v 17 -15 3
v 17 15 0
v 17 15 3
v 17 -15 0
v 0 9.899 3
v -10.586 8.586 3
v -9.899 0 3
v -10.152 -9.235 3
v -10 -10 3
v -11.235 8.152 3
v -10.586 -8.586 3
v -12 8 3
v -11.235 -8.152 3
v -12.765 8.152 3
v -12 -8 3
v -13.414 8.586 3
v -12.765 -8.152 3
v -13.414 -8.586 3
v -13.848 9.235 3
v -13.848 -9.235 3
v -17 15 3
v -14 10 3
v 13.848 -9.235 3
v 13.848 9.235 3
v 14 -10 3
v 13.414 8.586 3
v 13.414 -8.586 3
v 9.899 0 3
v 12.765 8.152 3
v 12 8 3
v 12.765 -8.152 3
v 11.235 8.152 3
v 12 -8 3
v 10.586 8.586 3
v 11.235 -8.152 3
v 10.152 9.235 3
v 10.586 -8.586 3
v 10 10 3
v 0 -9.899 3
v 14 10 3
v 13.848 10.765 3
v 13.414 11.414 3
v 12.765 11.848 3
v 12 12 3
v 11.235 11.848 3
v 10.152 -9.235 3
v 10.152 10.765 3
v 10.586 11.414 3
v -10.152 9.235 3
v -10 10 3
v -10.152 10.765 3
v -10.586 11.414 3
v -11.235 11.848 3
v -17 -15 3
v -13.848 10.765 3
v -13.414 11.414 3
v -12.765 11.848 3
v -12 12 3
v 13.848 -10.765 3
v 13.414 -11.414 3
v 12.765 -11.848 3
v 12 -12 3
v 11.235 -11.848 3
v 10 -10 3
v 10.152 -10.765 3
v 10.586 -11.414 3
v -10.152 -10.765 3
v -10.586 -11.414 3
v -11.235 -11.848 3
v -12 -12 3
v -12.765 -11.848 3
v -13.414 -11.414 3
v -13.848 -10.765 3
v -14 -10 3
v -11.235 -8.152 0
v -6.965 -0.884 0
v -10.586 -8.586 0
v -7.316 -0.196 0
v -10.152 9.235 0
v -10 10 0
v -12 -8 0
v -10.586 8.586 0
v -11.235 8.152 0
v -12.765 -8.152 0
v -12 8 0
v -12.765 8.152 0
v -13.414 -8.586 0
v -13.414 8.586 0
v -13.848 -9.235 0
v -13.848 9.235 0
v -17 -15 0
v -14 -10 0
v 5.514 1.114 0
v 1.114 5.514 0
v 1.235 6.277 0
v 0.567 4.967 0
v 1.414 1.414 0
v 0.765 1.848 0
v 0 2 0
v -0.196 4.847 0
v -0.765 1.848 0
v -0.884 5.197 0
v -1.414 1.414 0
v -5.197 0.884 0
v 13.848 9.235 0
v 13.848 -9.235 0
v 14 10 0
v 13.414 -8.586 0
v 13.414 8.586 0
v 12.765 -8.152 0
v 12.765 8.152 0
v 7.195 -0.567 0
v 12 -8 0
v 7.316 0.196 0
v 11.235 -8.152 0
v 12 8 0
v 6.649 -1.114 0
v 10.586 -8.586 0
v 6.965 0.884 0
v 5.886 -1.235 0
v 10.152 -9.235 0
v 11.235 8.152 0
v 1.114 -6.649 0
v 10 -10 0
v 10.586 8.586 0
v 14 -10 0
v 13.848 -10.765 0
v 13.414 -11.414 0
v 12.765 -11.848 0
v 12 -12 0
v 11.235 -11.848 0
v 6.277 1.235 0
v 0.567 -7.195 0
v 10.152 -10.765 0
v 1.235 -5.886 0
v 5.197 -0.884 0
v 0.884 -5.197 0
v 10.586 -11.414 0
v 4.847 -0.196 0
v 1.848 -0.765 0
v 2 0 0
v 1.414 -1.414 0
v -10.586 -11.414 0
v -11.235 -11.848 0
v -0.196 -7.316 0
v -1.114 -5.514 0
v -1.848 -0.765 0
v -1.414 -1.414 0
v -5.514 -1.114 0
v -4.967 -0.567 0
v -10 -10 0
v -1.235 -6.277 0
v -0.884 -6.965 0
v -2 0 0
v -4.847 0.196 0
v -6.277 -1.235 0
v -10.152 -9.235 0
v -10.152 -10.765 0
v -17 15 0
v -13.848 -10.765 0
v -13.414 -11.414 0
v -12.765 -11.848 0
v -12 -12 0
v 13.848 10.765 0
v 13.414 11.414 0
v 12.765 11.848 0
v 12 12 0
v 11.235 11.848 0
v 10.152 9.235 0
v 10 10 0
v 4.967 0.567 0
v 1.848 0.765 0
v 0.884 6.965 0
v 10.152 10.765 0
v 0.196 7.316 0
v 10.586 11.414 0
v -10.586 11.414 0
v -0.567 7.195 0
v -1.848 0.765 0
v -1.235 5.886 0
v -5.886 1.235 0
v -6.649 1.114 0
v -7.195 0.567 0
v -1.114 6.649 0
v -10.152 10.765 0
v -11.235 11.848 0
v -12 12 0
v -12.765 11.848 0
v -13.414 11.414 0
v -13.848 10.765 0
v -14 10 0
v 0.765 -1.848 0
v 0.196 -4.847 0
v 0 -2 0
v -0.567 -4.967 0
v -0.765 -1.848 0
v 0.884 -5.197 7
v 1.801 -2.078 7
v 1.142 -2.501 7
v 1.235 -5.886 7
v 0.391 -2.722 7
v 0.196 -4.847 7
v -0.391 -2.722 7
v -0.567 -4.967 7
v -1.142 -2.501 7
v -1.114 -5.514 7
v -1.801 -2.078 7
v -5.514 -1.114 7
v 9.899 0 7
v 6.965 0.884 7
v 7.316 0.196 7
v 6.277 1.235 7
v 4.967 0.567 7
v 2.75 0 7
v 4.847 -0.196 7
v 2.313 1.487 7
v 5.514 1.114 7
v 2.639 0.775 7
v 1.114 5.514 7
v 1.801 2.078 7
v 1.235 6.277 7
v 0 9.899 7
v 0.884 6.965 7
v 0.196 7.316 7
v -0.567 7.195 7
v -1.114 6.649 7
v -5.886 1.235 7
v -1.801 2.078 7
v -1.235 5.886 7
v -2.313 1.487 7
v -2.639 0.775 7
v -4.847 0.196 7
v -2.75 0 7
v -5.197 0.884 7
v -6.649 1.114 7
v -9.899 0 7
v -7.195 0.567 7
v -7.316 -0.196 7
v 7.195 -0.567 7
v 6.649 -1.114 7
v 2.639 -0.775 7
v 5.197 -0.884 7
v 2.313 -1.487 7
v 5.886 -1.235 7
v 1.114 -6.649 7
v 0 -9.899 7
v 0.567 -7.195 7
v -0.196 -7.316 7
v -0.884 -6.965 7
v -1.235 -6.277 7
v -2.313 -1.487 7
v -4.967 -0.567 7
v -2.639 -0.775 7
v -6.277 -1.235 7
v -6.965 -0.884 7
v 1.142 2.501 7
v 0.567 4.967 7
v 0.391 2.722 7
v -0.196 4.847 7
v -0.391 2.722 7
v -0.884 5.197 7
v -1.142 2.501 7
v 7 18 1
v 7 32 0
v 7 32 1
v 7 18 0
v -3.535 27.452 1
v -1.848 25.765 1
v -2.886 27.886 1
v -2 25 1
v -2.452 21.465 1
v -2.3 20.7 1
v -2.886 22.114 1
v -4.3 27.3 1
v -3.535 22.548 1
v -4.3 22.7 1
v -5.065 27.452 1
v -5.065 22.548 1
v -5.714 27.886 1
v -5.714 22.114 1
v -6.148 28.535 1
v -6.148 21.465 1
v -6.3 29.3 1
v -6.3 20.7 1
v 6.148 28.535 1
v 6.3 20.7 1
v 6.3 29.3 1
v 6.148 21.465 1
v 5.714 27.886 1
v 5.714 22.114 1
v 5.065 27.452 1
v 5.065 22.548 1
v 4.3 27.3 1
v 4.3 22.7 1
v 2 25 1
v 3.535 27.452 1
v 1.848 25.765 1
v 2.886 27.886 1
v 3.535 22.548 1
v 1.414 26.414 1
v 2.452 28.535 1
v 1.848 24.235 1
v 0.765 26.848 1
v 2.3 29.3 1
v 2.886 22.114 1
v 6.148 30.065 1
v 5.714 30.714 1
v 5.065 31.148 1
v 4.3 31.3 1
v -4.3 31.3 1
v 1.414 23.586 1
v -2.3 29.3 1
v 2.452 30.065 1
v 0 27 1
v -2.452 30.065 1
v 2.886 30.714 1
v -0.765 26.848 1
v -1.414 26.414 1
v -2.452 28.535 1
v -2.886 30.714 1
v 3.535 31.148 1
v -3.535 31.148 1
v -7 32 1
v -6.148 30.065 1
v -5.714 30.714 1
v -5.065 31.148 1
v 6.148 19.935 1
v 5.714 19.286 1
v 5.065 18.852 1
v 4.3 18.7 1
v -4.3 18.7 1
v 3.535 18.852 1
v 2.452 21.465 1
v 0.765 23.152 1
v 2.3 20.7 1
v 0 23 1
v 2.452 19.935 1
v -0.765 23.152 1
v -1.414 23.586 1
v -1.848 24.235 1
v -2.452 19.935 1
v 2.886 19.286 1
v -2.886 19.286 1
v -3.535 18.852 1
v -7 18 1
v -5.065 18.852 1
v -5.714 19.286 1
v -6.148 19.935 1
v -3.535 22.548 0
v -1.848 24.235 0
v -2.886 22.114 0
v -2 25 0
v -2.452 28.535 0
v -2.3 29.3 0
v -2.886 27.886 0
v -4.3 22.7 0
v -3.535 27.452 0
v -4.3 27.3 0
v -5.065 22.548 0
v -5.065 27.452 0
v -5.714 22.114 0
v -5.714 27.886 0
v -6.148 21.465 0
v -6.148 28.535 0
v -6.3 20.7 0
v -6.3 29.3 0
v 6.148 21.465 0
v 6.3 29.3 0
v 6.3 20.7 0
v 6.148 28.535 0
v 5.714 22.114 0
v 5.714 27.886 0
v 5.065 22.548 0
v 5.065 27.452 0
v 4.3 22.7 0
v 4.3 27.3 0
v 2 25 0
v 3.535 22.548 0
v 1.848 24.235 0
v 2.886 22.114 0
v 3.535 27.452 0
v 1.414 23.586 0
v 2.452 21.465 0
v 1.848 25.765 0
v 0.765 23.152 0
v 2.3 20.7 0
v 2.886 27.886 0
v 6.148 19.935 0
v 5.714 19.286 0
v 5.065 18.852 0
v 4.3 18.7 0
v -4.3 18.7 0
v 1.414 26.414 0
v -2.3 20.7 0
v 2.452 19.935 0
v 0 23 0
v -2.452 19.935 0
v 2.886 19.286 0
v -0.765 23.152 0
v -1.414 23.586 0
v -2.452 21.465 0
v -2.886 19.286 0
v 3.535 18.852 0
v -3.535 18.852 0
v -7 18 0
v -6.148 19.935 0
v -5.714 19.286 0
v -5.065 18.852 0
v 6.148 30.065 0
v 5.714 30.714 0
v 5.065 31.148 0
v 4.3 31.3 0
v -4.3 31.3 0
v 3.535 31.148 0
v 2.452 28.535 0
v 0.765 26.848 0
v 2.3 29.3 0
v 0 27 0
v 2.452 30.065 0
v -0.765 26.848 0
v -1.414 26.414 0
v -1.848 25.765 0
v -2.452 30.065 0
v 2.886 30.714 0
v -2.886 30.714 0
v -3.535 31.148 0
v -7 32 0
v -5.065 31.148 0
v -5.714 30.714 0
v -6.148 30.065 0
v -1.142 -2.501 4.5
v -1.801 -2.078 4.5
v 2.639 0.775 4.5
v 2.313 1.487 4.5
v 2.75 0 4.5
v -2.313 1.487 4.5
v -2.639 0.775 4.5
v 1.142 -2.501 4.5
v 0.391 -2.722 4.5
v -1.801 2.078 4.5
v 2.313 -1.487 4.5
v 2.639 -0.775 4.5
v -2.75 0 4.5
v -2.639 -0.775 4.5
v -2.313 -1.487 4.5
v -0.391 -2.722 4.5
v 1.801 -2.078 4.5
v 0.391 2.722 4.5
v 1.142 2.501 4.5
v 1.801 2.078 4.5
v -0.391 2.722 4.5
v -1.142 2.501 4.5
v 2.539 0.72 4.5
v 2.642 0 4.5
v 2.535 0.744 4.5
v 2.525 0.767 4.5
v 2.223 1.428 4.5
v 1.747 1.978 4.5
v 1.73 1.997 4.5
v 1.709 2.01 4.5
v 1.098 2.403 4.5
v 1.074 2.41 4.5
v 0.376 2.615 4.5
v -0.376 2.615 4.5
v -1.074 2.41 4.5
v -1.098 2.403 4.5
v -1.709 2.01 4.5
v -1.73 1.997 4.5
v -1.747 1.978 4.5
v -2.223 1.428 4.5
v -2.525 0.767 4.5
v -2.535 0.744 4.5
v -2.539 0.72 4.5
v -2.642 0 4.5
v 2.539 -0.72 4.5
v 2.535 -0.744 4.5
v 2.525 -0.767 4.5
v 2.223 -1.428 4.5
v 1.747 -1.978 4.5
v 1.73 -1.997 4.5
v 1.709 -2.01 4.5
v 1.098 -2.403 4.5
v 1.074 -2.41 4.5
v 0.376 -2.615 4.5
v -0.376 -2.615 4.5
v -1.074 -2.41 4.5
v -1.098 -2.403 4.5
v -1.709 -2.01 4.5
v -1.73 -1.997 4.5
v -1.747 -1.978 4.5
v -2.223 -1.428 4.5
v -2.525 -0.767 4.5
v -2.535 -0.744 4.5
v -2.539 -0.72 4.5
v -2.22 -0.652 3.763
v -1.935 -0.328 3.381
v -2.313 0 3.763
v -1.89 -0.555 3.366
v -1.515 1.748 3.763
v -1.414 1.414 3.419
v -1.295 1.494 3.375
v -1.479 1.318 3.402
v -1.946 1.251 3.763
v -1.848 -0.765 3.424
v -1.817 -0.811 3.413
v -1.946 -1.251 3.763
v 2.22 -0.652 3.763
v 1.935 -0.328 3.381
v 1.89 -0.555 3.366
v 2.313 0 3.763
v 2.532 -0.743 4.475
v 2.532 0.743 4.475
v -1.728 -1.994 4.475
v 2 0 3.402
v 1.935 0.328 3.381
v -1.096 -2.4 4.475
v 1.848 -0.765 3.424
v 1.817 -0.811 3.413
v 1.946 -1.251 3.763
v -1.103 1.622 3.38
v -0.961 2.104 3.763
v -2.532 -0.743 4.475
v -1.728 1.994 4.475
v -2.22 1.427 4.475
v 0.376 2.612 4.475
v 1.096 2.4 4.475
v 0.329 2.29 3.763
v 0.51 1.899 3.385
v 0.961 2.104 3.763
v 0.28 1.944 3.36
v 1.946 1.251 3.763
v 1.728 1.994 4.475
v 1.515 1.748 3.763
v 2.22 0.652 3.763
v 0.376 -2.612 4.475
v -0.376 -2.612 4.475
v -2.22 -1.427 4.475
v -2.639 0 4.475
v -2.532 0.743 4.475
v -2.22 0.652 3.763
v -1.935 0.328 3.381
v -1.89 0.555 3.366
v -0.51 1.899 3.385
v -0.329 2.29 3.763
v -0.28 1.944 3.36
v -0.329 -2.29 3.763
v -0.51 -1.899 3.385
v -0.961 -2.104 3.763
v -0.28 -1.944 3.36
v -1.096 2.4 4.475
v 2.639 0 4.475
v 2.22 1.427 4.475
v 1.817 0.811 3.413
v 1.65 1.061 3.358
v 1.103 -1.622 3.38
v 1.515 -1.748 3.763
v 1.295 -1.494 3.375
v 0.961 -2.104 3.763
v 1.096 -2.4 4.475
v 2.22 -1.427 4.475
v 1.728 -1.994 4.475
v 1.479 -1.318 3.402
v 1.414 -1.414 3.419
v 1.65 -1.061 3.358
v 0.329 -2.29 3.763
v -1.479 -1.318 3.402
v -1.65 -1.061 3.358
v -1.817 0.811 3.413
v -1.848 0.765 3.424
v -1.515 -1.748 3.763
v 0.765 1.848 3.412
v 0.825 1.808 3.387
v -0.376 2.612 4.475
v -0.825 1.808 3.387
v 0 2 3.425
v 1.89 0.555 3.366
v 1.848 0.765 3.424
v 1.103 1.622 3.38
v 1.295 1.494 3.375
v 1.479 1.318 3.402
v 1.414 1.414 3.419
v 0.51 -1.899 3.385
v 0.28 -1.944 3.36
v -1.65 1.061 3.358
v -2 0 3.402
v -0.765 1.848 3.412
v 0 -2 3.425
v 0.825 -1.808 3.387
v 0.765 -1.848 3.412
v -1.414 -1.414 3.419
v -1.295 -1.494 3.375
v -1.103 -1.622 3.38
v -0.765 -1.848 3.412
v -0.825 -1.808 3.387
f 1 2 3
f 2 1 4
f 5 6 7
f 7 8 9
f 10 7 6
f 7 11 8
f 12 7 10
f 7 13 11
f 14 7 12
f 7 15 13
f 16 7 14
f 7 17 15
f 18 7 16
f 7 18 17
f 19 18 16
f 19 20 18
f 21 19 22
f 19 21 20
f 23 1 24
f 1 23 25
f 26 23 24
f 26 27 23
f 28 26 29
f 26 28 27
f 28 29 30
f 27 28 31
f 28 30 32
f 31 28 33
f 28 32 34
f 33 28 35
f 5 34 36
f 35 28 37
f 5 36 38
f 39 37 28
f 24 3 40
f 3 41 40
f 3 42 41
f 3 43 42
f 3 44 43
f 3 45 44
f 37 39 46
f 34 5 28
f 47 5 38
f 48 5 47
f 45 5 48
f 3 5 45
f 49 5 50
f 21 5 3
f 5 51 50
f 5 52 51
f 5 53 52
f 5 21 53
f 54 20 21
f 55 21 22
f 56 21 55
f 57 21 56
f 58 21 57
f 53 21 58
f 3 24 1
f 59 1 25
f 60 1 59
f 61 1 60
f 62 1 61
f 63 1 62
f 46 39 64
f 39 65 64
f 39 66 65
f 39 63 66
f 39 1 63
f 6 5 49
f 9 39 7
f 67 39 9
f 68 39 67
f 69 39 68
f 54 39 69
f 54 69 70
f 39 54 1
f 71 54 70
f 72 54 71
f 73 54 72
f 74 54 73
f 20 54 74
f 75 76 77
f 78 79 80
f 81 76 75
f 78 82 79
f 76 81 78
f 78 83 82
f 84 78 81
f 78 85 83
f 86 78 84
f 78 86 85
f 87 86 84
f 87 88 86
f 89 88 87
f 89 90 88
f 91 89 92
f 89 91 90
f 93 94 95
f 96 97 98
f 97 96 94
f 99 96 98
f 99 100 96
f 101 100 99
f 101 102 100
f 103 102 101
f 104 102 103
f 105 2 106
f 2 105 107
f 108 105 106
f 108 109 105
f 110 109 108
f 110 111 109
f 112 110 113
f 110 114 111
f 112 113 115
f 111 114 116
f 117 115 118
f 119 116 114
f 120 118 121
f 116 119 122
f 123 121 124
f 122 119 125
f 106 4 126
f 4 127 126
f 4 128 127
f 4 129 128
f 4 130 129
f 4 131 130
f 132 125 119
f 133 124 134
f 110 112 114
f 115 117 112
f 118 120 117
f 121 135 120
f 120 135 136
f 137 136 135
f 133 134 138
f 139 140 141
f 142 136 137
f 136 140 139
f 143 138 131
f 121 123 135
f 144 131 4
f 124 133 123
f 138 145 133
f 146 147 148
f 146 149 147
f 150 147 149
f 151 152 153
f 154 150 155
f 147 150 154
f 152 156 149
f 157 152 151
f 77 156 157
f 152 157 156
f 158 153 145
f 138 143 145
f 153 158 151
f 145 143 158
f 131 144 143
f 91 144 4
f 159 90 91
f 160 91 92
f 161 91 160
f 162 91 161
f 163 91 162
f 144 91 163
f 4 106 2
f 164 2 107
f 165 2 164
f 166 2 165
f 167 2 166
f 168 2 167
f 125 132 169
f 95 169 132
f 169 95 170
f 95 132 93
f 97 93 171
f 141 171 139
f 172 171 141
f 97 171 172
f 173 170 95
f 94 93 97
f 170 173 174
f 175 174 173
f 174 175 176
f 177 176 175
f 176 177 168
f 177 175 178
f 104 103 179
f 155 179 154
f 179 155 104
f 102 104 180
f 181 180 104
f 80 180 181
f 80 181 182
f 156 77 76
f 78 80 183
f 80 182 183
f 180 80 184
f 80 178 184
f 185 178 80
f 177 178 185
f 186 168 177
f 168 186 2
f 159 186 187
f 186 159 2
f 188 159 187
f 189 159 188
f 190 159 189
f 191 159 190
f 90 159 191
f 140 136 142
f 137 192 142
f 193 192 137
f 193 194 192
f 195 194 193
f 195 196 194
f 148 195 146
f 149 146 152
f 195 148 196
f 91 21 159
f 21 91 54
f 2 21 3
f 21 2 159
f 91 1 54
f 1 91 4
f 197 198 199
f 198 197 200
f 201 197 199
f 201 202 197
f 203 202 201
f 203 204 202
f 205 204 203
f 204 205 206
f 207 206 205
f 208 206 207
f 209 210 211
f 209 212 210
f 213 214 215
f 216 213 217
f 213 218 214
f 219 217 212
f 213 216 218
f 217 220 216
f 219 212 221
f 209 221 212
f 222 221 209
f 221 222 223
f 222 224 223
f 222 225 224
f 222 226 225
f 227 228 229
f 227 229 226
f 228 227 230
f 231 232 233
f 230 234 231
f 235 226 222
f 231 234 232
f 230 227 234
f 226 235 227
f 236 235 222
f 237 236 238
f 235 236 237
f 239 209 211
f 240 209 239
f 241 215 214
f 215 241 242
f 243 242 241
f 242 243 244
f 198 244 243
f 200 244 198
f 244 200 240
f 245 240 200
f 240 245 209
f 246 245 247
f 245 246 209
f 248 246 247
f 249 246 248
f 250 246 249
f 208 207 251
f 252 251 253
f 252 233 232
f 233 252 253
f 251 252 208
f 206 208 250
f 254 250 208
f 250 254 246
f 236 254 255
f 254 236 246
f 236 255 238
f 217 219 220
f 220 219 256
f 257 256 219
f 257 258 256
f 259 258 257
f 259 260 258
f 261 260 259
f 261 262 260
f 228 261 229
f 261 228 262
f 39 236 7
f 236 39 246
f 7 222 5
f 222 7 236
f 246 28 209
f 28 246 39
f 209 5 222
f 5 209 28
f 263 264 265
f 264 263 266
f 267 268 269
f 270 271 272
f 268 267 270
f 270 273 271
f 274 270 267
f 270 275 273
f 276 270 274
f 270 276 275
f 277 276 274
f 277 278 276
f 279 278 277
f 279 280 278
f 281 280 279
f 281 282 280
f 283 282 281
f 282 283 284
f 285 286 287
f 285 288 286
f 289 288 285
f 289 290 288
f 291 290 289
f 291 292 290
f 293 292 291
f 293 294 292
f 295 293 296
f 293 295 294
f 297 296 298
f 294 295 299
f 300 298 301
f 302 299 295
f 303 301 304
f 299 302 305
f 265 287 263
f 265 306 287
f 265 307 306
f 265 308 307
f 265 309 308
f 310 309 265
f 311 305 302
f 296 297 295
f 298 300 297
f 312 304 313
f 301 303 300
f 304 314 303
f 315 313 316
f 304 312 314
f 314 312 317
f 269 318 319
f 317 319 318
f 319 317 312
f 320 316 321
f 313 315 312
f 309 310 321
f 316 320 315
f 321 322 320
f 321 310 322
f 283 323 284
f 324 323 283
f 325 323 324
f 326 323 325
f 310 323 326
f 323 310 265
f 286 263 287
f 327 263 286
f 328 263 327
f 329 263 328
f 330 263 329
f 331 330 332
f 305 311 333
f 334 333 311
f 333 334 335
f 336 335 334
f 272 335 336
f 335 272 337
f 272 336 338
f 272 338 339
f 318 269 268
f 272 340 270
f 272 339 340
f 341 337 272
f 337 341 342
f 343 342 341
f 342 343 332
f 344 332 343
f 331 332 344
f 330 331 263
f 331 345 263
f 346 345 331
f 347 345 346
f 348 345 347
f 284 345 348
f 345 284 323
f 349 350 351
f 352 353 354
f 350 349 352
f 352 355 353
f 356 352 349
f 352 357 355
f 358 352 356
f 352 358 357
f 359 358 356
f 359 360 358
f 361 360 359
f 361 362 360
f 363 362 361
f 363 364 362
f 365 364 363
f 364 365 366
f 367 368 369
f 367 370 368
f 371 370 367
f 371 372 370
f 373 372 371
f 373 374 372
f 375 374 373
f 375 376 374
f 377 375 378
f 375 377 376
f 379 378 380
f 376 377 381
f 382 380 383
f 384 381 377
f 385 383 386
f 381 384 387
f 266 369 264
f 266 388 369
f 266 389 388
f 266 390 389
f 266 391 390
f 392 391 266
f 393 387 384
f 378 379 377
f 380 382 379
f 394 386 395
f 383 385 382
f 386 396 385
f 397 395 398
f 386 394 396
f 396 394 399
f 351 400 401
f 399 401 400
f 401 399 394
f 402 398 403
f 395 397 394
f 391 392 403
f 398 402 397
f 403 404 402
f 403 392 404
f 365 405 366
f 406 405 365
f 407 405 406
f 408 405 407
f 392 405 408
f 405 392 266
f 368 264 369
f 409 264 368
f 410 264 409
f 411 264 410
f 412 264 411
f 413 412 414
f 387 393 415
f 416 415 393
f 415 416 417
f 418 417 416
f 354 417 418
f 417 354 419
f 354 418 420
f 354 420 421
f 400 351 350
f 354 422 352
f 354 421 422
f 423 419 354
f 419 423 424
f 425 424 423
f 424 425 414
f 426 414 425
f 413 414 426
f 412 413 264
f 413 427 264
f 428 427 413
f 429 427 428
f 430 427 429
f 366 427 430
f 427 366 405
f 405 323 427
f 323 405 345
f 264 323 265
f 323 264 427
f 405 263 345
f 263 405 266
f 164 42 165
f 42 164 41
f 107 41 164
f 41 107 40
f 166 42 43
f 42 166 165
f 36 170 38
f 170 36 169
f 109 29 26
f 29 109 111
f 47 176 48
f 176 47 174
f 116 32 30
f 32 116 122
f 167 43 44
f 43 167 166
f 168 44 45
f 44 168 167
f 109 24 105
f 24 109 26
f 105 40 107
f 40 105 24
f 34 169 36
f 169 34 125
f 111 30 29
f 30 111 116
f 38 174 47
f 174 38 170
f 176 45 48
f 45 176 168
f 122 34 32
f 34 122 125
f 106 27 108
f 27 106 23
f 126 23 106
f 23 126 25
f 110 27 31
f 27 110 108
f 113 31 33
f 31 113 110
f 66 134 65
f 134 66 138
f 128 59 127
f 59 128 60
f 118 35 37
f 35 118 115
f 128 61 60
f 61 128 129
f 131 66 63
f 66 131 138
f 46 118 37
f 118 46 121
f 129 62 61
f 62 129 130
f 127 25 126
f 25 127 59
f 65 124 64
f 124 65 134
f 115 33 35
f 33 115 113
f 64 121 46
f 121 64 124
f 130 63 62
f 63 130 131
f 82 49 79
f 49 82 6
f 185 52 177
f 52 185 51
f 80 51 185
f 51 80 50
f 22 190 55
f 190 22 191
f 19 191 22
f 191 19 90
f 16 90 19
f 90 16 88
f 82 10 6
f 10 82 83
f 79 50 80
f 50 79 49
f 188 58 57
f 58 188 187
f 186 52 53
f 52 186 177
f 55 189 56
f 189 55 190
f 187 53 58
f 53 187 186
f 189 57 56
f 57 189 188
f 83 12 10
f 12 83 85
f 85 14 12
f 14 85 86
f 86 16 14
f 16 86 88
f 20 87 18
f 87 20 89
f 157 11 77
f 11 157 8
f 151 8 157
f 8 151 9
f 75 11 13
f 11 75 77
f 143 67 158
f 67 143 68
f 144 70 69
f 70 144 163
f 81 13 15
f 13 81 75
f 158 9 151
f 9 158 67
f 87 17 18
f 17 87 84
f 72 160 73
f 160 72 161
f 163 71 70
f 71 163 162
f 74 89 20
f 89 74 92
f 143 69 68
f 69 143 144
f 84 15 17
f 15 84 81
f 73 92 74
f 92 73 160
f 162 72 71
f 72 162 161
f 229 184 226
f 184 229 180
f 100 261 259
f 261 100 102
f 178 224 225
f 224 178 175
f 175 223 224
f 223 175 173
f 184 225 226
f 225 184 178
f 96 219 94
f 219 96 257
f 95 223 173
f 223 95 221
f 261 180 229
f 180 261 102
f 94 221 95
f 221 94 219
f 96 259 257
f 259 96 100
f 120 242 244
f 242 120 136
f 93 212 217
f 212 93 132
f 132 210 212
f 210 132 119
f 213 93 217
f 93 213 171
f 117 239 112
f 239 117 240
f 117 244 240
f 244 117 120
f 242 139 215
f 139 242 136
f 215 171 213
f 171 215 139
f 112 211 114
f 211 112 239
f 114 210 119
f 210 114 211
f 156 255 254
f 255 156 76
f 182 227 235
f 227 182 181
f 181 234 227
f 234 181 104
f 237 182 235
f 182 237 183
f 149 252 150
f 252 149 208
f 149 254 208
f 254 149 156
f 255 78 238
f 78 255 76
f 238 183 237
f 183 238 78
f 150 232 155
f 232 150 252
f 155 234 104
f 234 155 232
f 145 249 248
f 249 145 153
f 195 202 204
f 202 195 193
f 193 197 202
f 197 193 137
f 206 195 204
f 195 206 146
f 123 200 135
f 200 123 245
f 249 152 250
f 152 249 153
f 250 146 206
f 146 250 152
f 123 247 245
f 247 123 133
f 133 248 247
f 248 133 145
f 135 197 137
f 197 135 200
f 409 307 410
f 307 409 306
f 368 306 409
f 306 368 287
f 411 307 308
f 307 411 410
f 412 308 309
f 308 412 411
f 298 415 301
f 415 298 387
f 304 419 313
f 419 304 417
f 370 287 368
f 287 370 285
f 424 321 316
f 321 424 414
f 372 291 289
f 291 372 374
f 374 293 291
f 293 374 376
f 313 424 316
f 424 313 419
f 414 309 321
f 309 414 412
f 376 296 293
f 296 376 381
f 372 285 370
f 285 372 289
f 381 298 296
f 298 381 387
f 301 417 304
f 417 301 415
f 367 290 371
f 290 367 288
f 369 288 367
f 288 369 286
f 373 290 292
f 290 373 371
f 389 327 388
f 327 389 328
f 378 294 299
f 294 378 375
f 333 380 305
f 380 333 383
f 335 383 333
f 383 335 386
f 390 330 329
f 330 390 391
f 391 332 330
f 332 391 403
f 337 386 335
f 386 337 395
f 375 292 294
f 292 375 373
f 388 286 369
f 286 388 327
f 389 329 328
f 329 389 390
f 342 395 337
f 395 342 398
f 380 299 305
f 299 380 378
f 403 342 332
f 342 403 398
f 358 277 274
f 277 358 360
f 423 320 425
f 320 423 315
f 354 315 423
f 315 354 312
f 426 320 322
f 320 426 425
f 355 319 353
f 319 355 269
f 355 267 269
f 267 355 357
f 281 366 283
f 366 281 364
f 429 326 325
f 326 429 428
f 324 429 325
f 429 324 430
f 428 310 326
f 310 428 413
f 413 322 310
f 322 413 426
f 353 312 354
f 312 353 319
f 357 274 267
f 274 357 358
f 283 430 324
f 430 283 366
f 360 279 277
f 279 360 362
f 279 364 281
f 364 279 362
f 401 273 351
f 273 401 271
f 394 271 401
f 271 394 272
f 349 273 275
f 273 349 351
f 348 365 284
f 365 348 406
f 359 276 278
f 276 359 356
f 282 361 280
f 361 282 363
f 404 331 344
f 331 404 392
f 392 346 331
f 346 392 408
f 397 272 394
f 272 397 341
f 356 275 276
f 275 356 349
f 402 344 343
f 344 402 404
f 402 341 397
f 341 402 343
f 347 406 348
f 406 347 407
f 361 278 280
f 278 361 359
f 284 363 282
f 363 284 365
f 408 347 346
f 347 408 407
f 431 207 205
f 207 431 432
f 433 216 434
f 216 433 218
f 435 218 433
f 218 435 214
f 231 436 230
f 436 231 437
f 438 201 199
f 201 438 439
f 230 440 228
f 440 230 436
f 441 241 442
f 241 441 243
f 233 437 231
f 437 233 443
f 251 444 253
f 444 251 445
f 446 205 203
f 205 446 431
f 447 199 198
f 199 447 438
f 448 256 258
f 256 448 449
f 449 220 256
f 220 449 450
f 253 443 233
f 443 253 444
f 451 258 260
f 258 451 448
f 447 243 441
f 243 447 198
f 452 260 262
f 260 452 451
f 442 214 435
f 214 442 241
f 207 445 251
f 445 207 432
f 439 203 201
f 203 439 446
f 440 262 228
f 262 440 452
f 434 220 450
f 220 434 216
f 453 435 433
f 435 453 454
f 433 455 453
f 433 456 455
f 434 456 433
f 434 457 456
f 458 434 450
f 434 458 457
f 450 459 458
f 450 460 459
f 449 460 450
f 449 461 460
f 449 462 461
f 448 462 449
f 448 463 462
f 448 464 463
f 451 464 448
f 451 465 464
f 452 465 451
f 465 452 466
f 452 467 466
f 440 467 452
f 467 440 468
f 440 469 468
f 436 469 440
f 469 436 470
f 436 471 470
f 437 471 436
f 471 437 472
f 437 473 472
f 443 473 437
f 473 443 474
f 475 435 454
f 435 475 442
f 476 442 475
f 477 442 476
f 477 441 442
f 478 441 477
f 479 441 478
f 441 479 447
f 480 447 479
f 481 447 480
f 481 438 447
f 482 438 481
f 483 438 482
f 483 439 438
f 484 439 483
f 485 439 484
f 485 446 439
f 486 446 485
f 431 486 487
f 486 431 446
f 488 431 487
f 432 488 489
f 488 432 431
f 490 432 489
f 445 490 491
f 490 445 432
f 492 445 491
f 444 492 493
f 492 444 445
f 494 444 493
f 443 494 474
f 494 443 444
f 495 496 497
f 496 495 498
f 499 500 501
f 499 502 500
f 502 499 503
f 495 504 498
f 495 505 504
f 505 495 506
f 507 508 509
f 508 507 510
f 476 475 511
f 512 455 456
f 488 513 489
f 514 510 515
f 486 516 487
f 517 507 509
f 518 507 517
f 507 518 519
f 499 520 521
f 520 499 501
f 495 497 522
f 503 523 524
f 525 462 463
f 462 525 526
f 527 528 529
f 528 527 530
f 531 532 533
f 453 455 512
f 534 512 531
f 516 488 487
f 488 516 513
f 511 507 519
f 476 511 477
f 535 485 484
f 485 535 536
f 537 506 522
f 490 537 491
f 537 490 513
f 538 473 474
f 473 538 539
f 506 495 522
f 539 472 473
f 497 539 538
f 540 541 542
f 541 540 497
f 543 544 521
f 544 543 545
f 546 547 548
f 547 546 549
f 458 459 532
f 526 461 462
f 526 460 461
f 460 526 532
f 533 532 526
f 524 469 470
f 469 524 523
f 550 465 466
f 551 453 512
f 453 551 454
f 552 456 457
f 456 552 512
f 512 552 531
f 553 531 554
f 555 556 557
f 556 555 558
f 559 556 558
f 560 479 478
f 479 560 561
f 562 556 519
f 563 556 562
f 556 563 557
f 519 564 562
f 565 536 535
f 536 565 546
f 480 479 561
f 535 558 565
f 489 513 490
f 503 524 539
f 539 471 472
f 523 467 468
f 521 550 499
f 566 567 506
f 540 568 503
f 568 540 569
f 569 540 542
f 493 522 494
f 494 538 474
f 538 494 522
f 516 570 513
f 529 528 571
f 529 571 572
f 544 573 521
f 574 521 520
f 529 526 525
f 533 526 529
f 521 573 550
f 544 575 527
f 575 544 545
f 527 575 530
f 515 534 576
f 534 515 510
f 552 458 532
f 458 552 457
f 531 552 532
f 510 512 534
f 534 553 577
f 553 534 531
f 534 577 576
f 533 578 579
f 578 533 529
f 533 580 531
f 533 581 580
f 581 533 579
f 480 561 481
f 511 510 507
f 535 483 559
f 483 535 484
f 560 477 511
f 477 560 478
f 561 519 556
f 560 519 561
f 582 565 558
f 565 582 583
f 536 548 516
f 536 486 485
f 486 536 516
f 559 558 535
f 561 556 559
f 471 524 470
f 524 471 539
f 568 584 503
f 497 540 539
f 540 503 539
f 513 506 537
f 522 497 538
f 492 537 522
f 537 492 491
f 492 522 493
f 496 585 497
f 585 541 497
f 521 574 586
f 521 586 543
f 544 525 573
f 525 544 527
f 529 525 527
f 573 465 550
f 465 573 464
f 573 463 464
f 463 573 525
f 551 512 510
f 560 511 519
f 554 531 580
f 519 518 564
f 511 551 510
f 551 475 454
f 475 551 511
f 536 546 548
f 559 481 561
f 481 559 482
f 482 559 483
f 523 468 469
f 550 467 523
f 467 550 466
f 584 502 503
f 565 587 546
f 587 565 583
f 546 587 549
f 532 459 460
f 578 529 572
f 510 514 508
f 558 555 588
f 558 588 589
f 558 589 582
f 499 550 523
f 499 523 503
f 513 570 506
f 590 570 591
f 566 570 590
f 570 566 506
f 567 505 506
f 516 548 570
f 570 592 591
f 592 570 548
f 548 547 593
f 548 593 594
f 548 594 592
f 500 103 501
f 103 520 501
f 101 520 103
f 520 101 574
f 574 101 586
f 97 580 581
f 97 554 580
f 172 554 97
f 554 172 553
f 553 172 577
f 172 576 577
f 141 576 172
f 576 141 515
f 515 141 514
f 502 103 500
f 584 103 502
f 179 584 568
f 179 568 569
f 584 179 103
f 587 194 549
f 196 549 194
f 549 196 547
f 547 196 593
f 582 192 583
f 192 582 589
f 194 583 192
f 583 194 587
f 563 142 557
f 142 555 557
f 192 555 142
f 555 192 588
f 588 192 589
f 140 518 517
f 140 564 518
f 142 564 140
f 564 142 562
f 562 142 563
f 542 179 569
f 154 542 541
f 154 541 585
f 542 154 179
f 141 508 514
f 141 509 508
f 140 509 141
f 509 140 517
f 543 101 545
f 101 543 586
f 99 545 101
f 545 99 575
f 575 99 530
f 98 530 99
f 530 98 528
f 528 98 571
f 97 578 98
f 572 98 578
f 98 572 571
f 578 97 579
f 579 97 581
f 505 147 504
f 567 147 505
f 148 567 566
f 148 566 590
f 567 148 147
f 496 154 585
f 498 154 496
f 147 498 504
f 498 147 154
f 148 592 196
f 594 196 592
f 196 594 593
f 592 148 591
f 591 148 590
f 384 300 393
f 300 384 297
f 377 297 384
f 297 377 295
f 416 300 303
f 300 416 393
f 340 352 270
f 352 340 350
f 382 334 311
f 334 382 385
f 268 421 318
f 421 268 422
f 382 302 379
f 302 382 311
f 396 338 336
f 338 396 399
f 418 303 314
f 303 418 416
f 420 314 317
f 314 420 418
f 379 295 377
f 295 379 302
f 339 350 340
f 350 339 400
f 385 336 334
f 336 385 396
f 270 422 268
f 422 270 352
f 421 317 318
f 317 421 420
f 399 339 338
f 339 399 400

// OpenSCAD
/************************************
*  FiberConnectDirect
*    connection for fiber optic to spectrometer body
*    consistes of mount and spacer.  
*    5 mm ball lens goes in mount, spacer on top
*    Flanged sma905 connector screws to that
************************************/

width = 34;
depth = 30;
xy = [1,-1];
xVal = 12;  // mounting hole dimensions
yVal = 10;
diam = 10;
spacer = 1;
ballDepth = 3.5;

holeDiam = [2.5,4];

$fa = 6;  // make holes roundish
$fs = 0.8;

module fourHole(x, y, dia, angle){
 //   xy = [1,-1];
for(a = [0:1],b=[0:1]){
    rotate([0,0,angle])
translate([x/2*xy[a],y/2*xy[b],5])
    cylinder(11,d=dia,center = true);
}    
}

difference(){
 union(){
  translate([0,0,1.5])
  cube([width,depth,3],center = true);
  rotate([0,0,45])
  translate([0,0,5])
    cube([14, 14,4], center = true);
  translate([0,25,spacer/2])

     cube([14, 14,spacer], center = true);
    }  // end of union
 
  fourHole(2*xVal,2*yVal,holeDiam[1],0); 
  fourHole(8.6,8.6,holeDiam[0],45);
    translate([0,25,0])
    fourHole(8.6,8.6,holeDiam[1],0);
 translate([0,0,8.5-ballDepth/2])
 cylinder(ballDepth+1,d=5.5,center = true);  //top cylinder to put ball in
 translate([0,0,7-ballDepth/2])
 sphere(d=5.5);
 translate([0,0,4])
 cylinder(10,d=4,center = true);
 translate([0,25,4])
 cylinder(10,d=4,center = true); 
//}
}
